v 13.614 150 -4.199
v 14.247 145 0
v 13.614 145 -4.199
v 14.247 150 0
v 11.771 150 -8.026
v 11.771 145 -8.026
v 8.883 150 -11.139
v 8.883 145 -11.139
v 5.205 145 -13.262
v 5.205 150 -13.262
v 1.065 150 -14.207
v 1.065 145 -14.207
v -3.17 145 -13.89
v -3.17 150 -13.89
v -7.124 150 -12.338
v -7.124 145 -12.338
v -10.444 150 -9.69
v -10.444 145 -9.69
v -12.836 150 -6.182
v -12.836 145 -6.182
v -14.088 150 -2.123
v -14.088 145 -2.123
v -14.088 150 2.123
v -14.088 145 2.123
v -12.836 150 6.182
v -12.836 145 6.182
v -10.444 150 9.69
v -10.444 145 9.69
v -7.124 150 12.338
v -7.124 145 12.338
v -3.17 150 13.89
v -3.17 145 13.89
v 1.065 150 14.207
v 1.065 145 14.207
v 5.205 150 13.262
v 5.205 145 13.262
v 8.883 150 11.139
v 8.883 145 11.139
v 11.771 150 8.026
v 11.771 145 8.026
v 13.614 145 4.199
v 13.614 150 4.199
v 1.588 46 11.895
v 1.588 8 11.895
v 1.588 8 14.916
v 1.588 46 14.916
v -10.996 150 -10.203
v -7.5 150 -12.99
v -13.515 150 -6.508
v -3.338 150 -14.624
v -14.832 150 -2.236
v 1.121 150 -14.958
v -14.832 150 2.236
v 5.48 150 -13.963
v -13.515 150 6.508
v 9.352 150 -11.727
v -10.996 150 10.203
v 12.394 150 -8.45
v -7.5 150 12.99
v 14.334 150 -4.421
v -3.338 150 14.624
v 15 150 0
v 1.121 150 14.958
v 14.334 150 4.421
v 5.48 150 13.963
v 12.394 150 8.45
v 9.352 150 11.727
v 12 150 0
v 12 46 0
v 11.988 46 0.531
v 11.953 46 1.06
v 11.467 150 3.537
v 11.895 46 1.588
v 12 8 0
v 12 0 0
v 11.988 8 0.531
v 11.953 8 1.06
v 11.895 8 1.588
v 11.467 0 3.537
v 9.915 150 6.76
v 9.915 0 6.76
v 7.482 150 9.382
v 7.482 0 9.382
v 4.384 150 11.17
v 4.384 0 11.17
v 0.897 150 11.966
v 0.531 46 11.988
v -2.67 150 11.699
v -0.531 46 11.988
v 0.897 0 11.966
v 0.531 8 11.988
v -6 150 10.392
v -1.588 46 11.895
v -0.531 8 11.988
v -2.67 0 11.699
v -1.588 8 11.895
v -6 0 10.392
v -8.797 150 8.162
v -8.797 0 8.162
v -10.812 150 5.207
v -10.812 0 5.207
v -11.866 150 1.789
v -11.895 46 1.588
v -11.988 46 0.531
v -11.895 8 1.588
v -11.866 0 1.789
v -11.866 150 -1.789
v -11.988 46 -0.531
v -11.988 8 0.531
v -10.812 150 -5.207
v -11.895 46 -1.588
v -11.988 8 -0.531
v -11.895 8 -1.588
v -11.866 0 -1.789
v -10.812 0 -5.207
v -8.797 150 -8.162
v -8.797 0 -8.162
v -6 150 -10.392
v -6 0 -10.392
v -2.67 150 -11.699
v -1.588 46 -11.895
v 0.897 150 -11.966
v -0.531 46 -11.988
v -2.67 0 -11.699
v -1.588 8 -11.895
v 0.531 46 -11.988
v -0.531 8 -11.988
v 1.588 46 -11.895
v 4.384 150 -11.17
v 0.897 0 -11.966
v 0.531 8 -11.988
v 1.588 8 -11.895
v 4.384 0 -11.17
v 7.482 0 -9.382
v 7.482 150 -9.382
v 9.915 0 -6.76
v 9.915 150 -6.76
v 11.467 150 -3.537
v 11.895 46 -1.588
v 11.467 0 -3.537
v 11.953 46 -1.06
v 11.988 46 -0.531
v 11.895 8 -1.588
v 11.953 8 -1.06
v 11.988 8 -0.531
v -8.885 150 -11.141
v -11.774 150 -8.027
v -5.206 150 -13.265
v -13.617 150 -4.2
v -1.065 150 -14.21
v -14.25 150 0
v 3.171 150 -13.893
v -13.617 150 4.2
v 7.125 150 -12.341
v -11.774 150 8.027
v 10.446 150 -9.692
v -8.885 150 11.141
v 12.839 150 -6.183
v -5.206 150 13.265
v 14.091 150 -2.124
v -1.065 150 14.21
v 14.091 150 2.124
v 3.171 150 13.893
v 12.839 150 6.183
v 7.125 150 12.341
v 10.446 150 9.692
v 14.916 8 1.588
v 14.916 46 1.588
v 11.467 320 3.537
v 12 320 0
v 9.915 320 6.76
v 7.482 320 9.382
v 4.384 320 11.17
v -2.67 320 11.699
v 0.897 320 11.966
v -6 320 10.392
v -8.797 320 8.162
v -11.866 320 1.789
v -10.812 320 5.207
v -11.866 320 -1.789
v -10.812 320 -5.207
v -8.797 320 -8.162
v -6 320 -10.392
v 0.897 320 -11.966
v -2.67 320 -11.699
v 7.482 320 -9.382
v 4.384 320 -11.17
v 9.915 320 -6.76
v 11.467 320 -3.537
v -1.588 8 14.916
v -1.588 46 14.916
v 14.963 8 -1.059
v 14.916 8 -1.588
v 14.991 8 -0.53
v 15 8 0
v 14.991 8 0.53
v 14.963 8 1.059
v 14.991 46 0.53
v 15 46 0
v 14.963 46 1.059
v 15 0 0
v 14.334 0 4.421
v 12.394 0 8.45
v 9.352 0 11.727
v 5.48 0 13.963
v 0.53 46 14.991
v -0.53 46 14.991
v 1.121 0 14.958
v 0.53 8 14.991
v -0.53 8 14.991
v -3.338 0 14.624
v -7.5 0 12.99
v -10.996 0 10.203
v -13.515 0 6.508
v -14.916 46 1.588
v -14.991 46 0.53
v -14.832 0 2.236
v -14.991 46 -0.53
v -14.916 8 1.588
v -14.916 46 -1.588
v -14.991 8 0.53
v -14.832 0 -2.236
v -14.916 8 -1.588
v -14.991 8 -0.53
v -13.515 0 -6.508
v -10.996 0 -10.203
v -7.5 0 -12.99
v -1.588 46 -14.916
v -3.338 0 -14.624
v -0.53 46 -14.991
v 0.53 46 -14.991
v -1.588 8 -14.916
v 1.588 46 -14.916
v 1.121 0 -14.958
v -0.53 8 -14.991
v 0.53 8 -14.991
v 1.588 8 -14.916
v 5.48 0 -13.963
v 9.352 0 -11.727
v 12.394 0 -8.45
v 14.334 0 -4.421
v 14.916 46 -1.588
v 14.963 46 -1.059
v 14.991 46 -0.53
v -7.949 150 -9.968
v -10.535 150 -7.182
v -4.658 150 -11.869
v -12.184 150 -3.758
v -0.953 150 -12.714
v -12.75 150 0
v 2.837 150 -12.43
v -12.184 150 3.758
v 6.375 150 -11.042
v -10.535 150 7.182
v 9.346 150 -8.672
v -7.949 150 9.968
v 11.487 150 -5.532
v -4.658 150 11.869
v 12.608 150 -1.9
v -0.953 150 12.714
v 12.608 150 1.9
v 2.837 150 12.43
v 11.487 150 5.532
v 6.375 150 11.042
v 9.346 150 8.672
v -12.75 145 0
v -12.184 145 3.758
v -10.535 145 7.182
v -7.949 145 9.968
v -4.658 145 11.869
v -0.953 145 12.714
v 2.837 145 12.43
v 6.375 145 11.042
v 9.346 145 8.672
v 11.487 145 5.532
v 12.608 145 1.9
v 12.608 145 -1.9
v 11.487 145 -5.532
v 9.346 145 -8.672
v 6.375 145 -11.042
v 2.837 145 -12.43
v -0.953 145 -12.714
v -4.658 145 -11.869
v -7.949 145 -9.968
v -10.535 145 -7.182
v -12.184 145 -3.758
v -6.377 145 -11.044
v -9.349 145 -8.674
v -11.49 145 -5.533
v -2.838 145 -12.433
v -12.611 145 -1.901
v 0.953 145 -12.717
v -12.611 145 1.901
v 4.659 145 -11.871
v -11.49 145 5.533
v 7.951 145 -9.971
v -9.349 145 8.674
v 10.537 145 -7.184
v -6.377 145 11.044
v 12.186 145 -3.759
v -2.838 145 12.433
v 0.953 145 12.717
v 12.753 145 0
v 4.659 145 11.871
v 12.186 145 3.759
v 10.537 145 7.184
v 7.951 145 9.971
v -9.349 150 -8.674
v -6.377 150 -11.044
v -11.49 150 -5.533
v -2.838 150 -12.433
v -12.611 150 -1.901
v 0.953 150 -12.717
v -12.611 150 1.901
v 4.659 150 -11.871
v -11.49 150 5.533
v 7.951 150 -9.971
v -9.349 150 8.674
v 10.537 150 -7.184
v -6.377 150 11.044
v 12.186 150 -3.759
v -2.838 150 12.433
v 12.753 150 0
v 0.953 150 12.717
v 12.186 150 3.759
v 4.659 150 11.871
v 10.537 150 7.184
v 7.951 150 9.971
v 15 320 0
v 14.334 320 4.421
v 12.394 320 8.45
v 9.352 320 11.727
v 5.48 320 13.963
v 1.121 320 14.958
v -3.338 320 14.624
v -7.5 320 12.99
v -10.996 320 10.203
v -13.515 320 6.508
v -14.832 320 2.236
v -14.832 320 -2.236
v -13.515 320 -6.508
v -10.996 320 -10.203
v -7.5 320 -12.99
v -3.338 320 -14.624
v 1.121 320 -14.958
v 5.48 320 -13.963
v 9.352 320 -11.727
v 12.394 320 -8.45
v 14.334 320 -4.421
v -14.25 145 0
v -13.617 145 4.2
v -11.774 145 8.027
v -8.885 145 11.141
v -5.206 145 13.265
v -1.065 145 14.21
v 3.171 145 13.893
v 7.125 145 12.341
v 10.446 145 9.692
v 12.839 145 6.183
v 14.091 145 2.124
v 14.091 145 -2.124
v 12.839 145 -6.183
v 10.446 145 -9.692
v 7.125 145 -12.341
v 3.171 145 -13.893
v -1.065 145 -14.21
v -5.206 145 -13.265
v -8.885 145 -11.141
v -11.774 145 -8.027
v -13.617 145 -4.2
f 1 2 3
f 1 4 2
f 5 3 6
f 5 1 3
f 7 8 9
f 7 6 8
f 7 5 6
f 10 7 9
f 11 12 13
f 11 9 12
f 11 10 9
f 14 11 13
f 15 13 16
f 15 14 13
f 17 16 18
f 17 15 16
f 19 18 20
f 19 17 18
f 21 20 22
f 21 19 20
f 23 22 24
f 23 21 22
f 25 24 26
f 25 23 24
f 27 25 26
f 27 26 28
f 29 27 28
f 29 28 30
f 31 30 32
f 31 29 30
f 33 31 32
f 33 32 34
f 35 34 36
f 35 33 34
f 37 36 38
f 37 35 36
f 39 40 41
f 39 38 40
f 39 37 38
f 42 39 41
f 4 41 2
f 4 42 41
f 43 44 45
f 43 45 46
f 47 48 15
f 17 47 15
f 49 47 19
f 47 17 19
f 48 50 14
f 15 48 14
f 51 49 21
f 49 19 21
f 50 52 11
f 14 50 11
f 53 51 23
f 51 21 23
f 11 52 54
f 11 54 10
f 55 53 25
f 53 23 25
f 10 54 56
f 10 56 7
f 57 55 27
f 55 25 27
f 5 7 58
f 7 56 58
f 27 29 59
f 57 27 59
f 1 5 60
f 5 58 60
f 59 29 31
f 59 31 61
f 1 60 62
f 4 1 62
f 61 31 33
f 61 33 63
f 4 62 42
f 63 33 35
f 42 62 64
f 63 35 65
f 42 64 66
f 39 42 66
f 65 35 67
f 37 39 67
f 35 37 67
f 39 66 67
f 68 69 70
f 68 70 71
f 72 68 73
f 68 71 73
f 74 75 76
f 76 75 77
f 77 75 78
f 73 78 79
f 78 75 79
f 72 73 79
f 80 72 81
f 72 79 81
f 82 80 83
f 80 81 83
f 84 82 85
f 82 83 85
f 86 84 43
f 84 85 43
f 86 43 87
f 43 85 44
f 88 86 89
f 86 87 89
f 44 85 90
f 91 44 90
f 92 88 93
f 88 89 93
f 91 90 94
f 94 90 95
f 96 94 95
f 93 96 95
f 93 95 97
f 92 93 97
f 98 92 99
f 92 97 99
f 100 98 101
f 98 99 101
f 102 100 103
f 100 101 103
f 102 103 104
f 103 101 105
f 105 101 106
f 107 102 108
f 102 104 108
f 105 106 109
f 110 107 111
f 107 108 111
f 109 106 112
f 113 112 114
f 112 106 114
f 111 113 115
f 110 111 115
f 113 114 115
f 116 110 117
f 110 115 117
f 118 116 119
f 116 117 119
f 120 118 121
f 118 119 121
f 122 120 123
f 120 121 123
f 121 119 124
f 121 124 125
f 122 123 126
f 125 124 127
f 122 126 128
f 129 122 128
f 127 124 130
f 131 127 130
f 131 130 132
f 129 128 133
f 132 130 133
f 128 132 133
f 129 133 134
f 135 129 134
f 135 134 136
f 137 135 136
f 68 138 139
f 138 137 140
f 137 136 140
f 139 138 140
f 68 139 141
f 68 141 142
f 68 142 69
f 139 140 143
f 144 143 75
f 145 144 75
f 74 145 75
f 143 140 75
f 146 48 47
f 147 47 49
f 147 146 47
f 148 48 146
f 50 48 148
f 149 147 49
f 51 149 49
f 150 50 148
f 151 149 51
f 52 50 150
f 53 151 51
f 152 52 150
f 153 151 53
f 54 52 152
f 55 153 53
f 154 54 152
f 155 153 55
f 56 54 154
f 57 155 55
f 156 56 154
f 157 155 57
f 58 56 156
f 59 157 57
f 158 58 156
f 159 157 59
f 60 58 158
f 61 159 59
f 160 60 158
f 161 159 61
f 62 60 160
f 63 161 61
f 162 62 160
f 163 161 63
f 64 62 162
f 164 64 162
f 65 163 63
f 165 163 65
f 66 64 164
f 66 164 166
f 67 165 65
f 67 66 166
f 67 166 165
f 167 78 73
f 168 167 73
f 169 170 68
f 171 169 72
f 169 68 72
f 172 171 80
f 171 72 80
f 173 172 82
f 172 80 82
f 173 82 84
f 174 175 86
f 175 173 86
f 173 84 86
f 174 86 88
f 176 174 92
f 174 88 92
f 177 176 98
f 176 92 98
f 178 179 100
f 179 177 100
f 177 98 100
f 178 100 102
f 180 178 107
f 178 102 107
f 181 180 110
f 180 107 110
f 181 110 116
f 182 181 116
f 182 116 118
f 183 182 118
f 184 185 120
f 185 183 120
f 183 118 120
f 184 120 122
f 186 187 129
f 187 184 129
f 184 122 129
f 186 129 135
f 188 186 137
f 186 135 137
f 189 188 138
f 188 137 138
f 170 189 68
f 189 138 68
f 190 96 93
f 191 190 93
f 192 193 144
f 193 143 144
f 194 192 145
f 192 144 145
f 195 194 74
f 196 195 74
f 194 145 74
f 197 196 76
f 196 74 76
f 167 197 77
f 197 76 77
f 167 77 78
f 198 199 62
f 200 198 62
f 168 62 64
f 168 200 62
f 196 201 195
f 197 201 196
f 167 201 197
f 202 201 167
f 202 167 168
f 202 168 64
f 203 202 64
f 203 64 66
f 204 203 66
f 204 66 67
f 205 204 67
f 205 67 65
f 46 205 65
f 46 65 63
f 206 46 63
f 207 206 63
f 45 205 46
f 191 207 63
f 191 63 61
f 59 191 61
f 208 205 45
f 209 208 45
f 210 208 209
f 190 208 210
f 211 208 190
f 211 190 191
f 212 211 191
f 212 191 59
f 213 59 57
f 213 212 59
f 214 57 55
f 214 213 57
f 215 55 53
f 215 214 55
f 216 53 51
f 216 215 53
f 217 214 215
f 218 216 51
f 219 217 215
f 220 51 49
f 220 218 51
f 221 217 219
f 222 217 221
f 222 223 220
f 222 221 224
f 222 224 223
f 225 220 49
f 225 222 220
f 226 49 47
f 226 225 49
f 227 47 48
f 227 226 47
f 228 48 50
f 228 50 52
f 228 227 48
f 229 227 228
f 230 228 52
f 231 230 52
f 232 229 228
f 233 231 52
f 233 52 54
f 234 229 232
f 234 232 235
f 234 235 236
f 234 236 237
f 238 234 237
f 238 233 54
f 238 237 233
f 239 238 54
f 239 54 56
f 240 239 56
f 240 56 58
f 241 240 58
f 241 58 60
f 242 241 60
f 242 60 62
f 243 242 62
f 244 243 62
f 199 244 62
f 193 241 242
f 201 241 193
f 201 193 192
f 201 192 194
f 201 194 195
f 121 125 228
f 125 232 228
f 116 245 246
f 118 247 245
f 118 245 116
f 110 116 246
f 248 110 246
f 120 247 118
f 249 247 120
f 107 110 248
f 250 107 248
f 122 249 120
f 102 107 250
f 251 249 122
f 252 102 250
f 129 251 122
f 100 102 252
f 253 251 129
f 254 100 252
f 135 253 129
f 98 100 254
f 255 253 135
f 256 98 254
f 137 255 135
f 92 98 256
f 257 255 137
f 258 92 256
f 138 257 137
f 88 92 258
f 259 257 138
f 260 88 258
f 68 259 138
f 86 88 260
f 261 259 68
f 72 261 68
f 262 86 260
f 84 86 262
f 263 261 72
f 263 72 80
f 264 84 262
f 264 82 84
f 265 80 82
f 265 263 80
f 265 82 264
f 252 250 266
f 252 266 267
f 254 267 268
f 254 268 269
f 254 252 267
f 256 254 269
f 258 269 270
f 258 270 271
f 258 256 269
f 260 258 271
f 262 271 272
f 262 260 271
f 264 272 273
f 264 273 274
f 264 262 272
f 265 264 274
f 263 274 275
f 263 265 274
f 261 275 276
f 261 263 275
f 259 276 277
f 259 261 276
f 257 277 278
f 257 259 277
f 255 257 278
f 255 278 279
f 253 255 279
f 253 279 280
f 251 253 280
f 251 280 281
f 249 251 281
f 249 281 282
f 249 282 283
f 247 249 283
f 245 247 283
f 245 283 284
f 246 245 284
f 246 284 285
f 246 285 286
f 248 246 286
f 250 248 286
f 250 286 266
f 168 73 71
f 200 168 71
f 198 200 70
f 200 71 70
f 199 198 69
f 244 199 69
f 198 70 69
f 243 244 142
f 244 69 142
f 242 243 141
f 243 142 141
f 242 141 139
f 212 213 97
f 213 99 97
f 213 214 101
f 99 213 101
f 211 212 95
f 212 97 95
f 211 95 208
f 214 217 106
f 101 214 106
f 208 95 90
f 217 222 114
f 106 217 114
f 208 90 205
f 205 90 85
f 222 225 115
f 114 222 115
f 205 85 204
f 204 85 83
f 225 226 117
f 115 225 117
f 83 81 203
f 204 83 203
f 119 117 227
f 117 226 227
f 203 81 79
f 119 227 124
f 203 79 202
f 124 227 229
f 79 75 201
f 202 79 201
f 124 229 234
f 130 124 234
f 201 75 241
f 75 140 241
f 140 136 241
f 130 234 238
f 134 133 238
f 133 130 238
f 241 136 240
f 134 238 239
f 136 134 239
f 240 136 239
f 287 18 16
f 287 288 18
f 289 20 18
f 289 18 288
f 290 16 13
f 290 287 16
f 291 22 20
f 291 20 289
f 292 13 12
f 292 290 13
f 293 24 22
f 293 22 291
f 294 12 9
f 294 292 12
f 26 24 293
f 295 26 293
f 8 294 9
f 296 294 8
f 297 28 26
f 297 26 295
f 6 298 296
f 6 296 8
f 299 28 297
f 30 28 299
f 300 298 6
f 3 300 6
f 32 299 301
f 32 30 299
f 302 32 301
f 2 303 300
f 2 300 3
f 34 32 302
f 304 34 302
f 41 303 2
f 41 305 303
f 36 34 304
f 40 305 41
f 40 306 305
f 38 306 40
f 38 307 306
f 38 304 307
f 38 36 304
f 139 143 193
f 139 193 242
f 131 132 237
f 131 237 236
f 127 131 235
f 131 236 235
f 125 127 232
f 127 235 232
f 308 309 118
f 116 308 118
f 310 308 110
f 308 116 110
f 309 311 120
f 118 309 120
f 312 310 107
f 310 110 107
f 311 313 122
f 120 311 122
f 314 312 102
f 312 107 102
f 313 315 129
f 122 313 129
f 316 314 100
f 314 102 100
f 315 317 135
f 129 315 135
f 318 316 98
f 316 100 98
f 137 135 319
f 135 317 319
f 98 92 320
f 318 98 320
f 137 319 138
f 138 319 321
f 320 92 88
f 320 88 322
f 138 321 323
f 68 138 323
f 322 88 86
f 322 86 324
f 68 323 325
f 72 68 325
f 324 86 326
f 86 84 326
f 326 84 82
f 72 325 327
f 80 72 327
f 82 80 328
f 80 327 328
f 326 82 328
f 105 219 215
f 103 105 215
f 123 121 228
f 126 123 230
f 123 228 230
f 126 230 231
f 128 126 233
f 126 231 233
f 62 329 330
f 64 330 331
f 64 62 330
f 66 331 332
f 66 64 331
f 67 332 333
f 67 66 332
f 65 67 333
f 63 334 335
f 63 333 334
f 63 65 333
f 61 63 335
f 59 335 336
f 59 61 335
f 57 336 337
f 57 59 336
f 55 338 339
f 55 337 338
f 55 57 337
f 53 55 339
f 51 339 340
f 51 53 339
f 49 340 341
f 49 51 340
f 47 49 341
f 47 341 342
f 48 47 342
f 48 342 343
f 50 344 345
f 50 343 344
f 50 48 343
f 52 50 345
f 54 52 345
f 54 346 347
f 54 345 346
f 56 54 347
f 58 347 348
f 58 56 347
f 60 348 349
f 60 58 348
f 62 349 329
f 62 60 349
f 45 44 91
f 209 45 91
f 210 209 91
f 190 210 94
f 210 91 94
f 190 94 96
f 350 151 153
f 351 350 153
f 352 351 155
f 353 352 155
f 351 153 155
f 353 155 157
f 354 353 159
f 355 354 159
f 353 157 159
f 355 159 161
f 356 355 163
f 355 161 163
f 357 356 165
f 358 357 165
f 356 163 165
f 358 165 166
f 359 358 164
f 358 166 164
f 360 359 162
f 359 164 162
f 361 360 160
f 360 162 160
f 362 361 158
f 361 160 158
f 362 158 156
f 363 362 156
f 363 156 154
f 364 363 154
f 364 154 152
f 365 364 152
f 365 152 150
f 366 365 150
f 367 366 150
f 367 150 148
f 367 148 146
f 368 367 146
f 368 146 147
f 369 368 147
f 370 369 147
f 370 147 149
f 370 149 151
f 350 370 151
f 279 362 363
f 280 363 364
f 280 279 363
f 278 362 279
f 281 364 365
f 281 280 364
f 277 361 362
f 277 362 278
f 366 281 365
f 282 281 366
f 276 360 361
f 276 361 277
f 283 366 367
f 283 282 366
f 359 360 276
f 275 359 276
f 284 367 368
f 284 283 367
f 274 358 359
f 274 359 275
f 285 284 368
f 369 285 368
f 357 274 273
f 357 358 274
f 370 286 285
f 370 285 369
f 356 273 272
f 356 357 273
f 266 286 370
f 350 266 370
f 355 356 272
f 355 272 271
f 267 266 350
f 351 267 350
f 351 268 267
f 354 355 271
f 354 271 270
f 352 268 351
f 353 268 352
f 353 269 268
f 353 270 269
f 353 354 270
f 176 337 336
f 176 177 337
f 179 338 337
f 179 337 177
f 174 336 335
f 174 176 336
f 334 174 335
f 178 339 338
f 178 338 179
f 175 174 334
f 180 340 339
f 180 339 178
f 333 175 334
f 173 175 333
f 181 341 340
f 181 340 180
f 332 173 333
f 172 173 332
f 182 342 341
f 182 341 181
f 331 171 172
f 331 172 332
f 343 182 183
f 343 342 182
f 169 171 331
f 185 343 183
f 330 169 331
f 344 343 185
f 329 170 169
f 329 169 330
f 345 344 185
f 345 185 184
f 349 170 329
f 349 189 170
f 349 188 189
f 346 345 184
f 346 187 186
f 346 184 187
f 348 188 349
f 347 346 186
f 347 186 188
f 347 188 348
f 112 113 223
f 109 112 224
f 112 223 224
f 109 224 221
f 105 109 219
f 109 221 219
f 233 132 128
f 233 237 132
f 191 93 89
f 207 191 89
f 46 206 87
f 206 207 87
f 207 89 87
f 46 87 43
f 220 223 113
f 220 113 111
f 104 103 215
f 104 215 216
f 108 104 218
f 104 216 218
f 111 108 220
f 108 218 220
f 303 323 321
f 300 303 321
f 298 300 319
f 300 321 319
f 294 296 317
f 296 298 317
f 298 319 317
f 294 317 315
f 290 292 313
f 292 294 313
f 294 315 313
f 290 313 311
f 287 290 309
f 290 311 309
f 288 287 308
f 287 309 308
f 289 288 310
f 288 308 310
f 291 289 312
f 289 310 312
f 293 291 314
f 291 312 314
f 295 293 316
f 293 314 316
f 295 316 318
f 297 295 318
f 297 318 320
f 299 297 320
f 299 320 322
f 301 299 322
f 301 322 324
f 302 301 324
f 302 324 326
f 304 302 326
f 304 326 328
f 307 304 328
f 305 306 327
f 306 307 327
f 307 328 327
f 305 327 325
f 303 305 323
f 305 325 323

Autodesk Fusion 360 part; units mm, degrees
sketch "Sketch1" plane through (0, 0, 0) normal (0, 1, 0) x (1, 0, 0)
  circle A0 centre (0, 0) radius 12
  circle A1 centre (0, 0) radius 15
  dimension "d2" = 24
  dimension "d4" = 3
extrude "Extrude1" add sketch "Sketch1" along normal blind 320 makes body 1
sketch "Sketch2" plane through (0, 0, 0) normal (1, 0, 0) x (0, 0, -1)
  line L0 (0, 0) -> (0, 8) construction
  line L1 (0, 8) -> (-1.5875, 8)
  line L2 (-1.5875, 8) -> (-1.5875, 46)
  line L3 (-1.5875, 46) -> (0, 46)
  line L4 (0, 8) -> (1.5875, 8)
  line L5 (1.5875, 8) -> (1.5875, 46)
  line L6 (1.5875, 46) -> (0, 46)
  line L7 (0, 46) -> (0, 65) construction
  dimension "d15" = 8
  dimension "d16" = 1.5875
  dimension "d17" = 38
  dimension "d18" = 38
  dimension "d19" = 19
sketch "Sketch3" plane through (0, 0, 0) normal (0, 1, 0) x (1, 0, 0)
sketch "Sketch4" plane through (0, 0, 0) normal (0, 1, 0) x (1, 0, 0)
ref_plane "WorkPlane1" through (0, 70, 0) normal (0, 1, 0) x (0, 0, 1)
sketch "Sketch5" plane through (0, 0, 0) normal (1, 0, 0) x (0, 0, -1)
extrude "Extrude2" cut sketch "Sketch2" along normal blind 19 and the other way blind 18 bodies 1
sketch "Sketch6" plane through (0, 0, 0) normal (0, 1, 0) x (1, 0, 0)
sketch "Sketch7" plane through (0, 0, 0) normal (0, 0, 1) x (1, 0, 0)
  line L0 (0, 0) -> (0, 8) construction
  line L1 (0, 8) -> (1.5875, 8)
  line L2 (1.5875, 8) -> (1.5875, 46)
  line L3 (1.5875, 46) -> (0, 46)
  line L4 (0, 8) -> (-1.5875, 8)
  line L5 (-1.5875, 8) -> (-1.5875, 46)
  line L6 (-1.5875, 46) -> (0, 46)
  line L7 (0, 46) -> (0, 65) construction
  dimension "d24" = 8
  dimension "d25" = 1.5875
  dimension "d26" = 38
  dimension "d27" = 38
  dimension "d28" = 19
extrude "Extrude3" cut sketch "Sketch7" along normal mid plane 36 bodies 1
ref_plane "WorkPlane2" through (0, 150, 0) normal (0, 1, 0) x (0, 0, 1)
split "Split1" by plane through (0, 150, 0) normal (0, 1, 0) bodies 1 makes body 2 at (14.9255, 206.6667, -1.4935)
sketch "Sketch8" plane through (0, 0, 0) normal (0, 0, 1) x (1, 0, 0)
ref_plane "WorkPlane3" through (0, 12.125, 0) normal (0.707107, 0, 0.707107) x (0, 1, 0)
sketch "Sketch9" plane through (0, 12.125, 0) normal (0.707107, 0, 0.707107) x (0, 1, 0)
sketch "Sketch10" plane through (0, 12.125, 0) normal (0.707107, 0, 0.707107) x (0, 1, 0)
sketch "Sketch11" plane through (0, 12.125, 0) normal (0.707107, 0, 0.707107) x (0, 1, 0)
sketch "Sketch12" plane through (0, 12.125, 0) normal (0.707107, 0, 0.707107) x (0, 1, 0)
sketch "Sketch13" plane through (0, 12.125, 0) normal (0.707107, 0, 0.707107) x (0, 1, 0)
sketch "Sketch14" plane through (0, 12.125, 0) normal (0.707107, 0, 0.707107) x (0, 1, 0)
sketch "Sketch15" plane through (0, 150, 0) normal (0, 1, 0) x (-1, 0, 0)
  circle A0 centre (0, 0) radius 12
  circle A1 centre (0, 0) radius 15
  circle A2 centre (0, 0) radius 12.75
  circle A3 centre (0, 0) radius 14.25
  dimension "d33" = 0.75
  dimension "d34" = -0.75
extrude "Extrude4" cut sketch "Sketch15" against normal blind 5 contours A3 bodies 1
sketch "Sketch16" plane through (0, 150, 0) normal (0, -1, 0) x (1, 0, 0)
  circle A0 centre (0, 0) radius 15
  circle A1 centre (0, 0) radius 12
  circle A2 centre (0, 0) radius 12.753
  circle A3 centre (0, 0) radius 14.247
  dimension "d37" = 0.753
  dimension "d38" = -0.753
extrude "Extrude5" add sketch "Sketch16" along normal blind 5 contours A3 bodies 2
copy_body "Body->Comp1" bodies 1 removing the originals makes body 3 in component "Component"
copy_body "Body->Comp2" bodies 2 removing the originals makes body 4 in component "Component'"
component "Component" placed x (1, 0, 0) y (0, 1, 0) z (0, 0, 1) at (0, 0, 0)
component "Component'" placed x (1, 0, 0) y (0, 1, 0) z (0, 0, 1) at (0, 0, 0)
equation "innerDiameter = 24 mm"
equation "thickness = 3 mm"
equation "d4 = thickness"
equation "length = 320 mm"
equation "d6 = length"
equation "finLength = 50 mm"
equation "finWidth = 0.125 in"
equation "d16 = finWidth / 2"
equation "d25 = finWidth / 2"
